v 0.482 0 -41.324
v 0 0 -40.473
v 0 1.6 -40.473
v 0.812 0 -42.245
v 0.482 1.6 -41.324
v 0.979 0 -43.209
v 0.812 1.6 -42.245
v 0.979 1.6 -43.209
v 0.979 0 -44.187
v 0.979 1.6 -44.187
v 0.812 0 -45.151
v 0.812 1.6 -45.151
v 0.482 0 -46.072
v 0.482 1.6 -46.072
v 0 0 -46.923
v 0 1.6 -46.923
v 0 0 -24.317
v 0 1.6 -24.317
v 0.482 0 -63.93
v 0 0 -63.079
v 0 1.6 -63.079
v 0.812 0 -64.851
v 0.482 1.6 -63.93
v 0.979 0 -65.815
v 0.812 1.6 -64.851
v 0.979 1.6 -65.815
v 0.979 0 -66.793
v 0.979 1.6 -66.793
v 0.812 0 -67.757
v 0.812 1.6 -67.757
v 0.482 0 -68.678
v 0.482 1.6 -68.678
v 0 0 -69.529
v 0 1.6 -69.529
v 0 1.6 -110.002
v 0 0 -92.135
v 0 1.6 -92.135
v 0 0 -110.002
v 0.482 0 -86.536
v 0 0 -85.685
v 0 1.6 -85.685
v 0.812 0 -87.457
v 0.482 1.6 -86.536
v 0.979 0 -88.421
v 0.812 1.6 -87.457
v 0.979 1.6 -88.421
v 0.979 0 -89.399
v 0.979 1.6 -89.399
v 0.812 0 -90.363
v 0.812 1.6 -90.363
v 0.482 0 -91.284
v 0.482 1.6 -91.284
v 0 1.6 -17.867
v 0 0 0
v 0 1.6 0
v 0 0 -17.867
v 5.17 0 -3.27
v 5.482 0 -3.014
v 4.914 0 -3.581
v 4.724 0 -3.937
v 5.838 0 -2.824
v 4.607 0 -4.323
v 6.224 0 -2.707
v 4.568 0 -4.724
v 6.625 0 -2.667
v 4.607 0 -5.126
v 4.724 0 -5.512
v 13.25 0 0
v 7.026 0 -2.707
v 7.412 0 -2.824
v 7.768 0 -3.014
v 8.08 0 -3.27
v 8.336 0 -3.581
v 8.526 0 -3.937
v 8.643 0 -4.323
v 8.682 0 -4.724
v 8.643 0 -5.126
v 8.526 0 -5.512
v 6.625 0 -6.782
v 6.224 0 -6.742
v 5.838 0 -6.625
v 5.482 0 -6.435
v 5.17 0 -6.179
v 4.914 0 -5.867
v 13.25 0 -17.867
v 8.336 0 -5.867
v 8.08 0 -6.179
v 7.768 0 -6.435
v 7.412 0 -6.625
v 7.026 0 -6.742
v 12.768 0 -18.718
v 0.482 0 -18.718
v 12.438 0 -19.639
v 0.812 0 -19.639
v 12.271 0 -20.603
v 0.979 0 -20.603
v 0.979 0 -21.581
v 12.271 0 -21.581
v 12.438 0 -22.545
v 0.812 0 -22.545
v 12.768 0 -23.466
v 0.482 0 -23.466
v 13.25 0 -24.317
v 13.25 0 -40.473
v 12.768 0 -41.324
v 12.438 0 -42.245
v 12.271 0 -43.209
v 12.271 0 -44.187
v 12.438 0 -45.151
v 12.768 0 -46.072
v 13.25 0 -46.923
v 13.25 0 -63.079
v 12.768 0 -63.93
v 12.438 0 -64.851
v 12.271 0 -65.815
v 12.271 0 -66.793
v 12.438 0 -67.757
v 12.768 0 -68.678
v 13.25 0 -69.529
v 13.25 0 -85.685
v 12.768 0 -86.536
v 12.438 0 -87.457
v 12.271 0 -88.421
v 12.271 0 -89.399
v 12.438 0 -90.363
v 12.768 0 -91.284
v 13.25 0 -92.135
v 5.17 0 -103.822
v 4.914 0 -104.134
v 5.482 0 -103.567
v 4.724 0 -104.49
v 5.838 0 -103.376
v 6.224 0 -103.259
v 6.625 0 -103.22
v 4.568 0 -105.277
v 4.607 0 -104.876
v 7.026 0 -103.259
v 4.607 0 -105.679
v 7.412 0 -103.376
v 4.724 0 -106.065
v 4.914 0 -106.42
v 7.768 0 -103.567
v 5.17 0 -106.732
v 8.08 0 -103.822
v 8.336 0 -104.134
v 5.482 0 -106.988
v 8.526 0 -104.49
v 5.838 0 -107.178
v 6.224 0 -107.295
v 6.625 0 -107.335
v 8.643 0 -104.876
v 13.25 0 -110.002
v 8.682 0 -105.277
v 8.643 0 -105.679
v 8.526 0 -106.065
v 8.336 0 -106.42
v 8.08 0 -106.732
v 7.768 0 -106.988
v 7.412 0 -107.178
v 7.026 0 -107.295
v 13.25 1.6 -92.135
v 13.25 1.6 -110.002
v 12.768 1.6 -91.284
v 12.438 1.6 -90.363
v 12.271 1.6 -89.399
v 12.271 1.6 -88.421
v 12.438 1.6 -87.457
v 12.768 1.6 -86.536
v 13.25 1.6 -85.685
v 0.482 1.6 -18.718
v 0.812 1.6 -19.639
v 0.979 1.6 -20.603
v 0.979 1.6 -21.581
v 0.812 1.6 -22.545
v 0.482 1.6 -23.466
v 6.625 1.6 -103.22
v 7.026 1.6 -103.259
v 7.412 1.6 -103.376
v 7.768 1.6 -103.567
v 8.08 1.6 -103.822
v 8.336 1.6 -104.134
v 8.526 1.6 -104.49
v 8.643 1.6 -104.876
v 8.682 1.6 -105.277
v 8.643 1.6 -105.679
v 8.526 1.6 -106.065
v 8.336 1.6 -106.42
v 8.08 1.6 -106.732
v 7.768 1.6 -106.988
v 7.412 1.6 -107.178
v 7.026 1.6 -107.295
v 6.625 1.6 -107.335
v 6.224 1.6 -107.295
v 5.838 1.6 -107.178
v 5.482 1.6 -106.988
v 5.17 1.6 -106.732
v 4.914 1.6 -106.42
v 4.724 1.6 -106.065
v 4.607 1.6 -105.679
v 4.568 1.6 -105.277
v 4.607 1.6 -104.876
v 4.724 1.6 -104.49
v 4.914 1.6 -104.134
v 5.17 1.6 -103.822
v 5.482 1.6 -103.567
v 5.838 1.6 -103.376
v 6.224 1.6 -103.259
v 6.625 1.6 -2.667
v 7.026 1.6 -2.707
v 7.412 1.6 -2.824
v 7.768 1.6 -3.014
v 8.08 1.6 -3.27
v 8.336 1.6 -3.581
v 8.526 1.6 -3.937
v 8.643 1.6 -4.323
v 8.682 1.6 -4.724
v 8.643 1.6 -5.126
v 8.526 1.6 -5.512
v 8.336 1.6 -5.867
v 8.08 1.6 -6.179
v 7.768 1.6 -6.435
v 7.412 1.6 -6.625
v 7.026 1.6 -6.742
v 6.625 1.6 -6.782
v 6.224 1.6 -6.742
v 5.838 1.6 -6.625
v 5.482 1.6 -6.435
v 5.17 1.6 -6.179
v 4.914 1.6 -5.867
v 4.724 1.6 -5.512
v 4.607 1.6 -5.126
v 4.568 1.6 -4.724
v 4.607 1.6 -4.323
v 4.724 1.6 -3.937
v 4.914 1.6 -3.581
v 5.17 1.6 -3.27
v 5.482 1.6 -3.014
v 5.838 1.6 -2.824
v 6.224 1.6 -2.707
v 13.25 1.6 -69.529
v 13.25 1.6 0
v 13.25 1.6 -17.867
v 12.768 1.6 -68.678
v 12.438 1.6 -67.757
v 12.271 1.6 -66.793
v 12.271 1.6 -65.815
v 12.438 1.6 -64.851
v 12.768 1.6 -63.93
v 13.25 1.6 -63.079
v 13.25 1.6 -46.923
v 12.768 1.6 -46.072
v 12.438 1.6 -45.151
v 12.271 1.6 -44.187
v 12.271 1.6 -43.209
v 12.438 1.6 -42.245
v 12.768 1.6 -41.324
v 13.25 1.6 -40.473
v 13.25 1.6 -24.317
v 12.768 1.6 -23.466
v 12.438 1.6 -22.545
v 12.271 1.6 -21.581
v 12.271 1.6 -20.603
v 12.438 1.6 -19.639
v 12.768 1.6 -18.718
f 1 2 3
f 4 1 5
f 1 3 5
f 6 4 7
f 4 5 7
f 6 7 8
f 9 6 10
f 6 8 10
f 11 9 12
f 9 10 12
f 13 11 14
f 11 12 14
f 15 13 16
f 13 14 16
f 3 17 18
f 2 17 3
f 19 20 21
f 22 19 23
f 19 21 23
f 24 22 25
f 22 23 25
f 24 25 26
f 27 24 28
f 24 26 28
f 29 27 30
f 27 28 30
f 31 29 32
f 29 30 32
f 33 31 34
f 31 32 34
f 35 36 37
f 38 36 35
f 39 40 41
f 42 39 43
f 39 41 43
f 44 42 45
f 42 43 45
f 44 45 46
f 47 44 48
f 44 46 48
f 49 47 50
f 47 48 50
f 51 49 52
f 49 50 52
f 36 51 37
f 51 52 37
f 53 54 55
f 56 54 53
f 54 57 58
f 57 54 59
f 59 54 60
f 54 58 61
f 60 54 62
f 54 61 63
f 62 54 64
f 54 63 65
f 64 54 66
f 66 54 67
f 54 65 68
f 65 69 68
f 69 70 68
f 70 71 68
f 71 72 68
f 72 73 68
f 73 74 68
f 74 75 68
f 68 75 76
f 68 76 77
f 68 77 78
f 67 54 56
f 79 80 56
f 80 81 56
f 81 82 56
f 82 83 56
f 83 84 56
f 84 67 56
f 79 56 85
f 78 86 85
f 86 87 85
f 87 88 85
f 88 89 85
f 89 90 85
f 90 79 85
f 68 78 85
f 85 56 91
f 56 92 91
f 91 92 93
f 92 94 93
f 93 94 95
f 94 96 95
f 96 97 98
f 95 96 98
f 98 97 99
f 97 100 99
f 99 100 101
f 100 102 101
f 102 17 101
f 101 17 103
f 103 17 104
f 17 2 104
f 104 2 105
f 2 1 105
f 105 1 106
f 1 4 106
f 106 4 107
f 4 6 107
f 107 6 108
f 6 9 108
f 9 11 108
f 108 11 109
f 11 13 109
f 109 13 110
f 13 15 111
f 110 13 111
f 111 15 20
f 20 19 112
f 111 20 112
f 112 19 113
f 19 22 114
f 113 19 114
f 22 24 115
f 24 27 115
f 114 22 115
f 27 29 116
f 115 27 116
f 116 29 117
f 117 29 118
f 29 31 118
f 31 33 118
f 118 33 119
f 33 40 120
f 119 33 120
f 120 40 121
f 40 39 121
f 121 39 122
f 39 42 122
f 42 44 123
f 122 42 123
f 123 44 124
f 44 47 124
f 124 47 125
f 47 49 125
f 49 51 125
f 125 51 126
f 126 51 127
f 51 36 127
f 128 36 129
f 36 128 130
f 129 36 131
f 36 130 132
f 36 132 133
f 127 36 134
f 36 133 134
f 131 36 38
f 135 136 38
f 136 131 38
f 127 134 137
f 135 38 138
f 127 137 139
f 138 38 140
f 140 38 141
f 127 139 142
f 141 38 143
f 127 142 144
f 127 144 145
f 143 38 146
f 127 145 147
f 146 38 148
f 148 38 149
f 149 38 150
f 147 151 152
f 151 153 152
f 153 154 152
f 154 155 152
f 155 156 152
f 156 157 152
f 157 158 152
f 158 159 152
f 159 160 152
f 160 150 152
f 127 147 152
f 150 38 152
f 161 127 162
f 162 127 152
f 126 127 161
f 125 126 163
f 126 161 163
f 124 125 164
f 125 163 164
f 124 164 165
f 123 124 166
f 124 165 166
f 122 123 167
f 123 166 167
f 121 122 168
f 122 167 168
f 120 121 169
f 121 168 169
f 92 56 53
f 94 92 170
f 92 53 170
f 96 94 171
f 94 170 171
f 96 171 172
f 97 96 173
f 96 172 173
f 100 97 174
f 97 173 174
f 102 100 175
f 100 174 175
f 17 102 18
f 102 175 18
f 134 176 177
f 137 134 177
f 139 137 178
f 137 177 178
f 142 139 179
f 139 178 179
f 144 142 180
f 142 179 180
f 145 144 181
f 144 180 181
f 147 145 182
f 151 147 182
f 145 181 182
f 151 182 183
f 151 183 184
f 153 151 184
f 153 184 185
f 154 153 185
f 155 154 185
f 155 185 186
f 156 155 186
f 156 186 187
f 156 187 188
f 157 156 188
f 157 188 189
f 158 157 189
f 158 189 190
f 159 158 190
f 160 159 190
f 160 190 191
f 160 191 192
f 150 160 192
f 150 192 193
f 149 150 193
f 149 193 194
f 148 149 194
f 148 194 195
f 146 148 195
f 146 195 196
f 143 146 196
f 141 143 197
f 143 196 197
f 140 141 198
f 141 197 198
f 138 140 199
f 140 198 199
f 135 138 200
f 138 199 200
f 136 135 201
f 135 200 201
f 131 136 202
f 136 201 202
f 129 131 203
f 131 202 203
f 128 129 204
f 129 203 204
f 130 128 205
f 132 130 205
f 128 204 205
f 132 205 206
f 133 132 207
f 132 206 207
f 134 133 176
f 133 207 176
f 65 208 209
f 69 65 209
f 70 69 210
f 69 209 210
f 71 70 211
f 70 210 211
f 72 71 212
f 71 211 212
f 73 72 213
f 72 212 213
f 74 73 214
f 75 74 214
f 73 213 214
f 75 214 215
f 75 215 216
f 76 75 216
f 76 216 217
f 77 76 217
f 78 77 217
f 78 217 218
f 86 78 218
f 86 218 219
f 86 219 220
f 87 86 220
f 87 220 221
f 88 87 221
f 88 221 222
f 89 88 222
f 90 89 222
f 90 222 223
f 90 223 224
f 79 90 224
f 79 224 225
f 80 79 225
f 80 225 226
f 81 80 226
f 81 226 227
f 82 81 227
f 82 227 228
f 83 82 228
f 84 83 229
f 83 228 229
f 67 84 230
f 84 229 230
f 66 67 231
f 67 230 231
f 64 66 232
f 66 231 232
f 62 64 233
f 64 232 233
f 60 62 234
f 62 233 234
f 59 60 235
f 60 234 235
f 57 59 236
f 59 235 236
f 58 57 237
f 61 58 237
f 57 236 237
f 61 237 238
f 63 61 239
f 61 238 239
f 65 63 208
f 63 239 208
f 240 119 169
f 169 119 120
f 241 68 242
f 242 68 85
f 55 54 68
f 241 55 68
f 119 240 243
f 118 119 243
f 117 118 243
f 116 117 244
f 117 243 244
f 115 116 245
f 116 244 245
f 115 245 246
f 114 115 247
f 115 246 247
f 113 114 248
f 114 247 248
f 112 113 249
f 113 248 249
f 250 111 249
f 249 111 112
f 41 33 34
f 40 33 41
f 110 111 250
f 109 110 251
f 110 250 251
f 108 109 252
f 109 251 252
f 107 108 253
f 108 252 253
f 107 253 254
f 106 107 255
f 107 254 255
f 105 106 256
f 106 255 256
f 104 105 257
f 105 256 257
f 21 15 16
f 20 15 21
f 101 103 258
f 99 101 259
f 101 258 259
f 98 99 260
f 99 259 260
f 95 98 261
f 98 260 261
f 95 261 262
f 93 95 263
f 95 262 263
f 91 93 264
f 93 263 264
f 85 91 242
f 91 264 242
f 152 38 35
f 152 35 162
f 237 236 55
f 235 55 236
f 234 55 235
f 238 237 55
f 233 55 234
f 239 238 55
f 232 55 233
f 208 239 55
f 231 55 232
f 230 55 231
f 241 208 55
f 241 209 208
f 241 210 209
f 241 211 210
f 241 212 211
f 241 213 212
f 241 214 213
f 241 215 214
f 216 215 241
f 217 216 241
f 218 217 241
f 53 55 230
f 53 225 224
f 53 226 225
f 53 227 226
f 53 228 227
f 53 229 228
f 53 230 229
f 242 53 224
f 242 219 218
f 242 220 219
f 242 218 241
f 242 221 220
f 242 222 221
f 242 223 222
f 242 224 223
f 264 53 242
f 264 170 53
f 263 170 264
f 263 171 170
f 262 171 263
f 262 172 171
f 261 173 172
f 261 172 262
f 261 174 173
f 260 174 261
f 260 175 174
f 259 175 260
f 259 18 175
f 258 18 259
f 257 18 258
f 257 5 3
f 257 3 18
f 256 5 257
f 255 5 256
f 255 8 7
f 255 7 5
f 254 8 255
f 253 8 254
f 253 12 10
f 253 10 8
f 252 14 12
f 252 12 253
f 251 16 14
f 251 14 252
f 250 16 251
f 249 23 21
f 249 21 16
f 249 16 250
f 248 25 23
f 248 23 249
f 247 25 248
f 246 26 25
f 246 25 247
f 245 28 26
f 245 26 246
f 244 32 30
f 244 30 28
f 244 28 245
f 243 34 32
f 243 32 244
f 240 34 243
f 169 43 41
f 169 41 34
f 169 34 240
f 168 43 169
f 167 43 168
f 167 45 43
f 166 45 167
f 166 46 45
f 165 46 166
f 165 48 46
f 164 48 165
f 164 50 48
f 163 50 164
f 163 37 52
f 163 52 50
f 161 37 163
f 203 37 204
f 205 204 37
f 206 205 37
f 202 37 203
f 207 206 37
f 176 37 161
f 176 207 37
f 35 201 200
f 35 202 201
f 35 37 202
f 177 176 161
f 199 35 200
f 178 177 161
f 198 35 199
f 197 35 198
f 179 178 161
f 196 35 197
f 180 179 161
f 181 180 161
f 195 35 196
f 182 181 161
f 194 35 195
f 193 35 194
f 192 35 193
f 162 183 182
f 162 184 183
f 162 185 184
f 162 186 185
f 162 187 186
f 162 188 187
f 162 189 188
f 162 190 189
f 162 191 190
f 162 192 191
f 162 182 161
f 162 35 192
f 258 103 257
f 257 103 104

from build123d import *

# Parameters (mm, degrees)
SKETCH1_W           = 13.25
SKETCH1_H           = 110.001600164
BOSS_EXTRUDE1_DEPTH = 1.6002
SKETCH2_R           = 2.0574
CUT_EXTRUDE1_DEPTH  = 111.808281183
SKETCH3_R           = 5.699999998
CUT_EXTRUDE2_DEPTH  = 111.808281183


with BuildPart() as part:
    # Sketch1 → Boss-Extrude1 (new body)
    with BuildSketch(Plane(origin=(0, 0, 0), x_dir=(1, 0, 0), z_dir=(0, 1, 0))):
        with Locations((6.625, 55.000800082)):
            Rectangle(SKETCH1_W, SKETCH1_H)
    extrude(amount=BOSS_EXTRUDE1_DEPTH)

    # Sketch2 → Cut-Extrude1 (cut, through all)
    with BuildSketch(Plane(origin=(0, 1.6002, 0), x_dir=(1, 0, 0), z_dir=(0, 1, 0))):
        with Locations(Location((6.625, 4.7244, 0), (0, 0, 270))):
            Circle(SKETCH2_R)
        with Locations(Location((6.625, 105.277200164, 0), (0, 0, 270))):
            Circle(SKETCH2_R)
    extrude(amount=-CUT_EXTRUDE1_DEPTH, mode=Mode.SUBTRACT)

    # Sketch3 → Cut-Extrude2 (cut, through all)
    with BuildSketch(Plane(origin=(0, 1.6002, 0), x_dir=(1, 0, 0), z_dir=(0, 1, 0))):
        with Locations((-4.699999998, 88.909788652)):
            Circle(SKETCH3_R)
        with Locations((-4.699999998, 66.303788652)):
            Circle(SKETCH3_R)
        with Locations((-4.699999998, 43.697788652)):
            Circle(SKETCH3_R)
        with Locations((-4.699999998, 21.091788652)):
            Circle(SKETCH3_R)
        with Locations((17.949999998, 21.091788652)):
            Circle(SKETCH3_R)
        with Locations((17.949999998, 43.697788652)):
            Circle(SKETCH3_R)
        with Locations((17.949999998, 66.303788652)):
            Circle(SKETCH3_R)
        with Locations((17.949999998, 88.909788652)):
            Circle(SKETCH3_R)
    extrude(amount=-CUT_EXTRUDE2_DEPTH, mode=Mode.SUBTRACT)


solid = part.part
